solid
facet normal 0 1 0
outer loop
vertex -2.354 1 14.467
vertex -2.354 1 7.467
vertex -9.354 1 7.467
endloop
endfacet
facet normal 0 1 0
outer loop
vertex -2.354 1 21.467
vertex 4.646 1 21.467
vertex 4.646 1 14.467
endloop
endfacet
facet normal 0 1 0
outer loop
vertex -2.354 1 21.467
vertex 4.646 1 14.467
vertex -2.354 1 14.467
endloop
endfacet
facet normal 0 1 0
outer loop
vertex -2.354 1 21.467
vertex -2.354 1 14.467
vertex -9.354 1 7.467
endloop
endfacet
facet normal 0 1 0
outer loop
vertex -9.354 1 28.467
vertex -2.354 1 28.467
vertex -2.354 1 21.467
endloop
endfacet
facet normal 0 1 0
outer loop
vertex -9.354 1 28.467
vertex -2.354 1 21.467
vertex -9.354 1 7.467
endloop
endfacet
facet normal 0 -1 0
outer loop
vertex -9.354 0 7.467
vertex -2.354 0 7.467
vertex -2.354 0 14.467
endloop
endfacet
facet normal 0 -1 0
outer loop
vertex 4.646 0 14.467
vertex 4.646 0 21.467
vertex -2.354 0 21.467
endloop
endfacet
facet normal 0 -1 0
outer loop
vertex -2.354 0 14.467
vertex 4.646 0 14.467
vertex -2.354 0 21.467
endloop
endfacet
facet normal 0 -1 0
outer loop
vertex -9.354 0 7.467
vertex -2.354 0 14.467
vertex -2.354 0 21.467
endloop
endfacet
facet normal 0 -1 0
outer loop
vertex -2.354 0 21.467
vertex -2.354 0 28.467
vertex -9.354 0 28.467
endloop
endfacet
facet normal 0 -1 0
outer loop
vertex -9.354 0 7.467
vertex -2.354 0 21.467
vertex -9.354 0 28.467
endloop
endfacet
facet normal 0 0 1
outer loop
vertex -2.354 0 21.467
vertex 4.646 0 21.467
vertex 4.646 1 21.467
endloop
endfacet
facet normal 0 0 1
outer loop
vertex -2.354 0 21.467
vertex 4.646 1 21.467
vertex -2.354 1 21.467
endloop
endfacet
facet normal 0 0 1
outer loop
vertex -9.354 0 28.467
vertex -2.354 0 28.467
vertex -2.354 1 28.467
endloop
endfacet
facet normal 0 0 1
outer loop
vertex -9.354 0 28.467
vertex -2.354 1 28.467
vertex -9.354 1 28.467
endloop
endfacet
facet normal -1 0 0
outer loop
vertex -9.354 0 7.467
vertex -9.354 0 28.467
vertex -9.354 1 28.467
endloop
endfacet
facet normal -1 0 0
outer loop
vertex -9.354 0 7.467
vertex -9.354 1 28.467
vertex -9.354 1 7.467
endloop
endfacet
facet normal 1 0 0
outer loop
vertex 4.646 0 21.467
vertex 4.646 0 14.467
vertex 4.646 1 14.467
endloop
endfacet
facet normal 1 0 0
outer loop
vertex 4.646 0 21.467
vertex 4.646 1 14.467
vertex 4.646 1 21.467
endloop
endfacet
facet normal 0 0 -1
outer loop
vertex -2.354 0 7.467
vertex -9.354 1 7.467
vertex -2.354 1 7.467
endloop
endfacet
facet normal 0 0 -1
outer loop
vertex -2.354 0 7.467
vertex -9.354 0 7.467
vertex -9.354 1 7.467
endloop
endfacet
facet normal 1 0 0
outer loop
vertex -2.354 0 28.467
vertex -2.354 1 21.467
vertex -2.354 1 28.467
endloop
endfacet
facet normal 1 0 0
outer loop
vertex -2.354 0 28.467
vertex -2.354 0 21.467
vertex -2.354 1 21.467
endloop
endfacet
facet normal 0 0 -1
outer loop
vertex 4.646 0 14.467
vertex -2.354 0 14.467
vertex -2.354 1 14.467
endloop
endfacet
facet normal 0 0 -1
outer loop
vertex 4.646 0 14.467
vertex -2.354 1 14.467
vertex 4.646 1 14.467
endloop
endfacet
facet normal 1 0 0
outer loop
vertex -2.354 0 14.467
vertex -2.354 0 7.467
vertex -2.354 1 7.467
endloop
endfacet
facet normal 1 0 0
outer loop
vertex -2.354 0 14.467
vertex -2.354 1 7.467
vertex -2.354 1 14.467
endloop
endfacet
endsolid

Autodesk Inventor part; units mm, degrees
ref_plane "YZ Plane" through (0, 0, 0) normal (1, 0, 0) x (0, 1, 0)
ref_plane "XZ Plane" through (0, 0, 0) normal (0, 1, 0) x (-1, 0, 0)
ref_plane "XY Plane" through (0, 0, 0) normal (0, 0, 1) x (1, 0, 0)
sketch "Sketch1" plane through (0, 0, 0) normal (0, 1, 0) x (-1, 0, 0)
  line L0 (9.3536, 7.4669) -> (2.3536, 7.4669)
  line L1 (2.3536, 7.4669) -> (2.3536, 14.4669)
  line L2 (2.3536, 14.4669) -> (-4.6464, 14.4669)
  line L3 (-4.6464, 14.4669) -> (-4.6464, 21.4669)
  line L4 (-4.6464, 21.4669) -> (2.3536, 21.4669)
  line L5 (2.3536, 21.4669) -> (2.3536, 28.4669)
  line L6 (2.3536, 28.4669) -> (9.3536, 28.4669)
  line L7 (9.3536, 28.4669) -> (9.3536, 7.4669)
  point P0 (0, 0)
  dimension "d0" = 7
  dimension "d1" = 7
  dimension "d2" = 21
extrude "Plate1" add sketch "Sketch1" along normal blind 1
equation "\"d3\" = Thickness"
equation "\"BendRadius\" = Thickness"
equation "\"BendReliefWidth\" = Thickness"
equation "\"BendReliefDepth\" = 0.5 * Thickness"
equation "\"CornerReliefSize\" = 4 * Thickness"
equation "\"MinimumRemnant\" = 2 * Thickness"
equation "\"TransitionRadius\" = BendRadius"
equation "\"JacobiRadiusSize\" = BendRadius"
equation "\"GapSize\" = Thickness"
equation "\"Thickness\" = 1"
properties material "Steel, Mild"
